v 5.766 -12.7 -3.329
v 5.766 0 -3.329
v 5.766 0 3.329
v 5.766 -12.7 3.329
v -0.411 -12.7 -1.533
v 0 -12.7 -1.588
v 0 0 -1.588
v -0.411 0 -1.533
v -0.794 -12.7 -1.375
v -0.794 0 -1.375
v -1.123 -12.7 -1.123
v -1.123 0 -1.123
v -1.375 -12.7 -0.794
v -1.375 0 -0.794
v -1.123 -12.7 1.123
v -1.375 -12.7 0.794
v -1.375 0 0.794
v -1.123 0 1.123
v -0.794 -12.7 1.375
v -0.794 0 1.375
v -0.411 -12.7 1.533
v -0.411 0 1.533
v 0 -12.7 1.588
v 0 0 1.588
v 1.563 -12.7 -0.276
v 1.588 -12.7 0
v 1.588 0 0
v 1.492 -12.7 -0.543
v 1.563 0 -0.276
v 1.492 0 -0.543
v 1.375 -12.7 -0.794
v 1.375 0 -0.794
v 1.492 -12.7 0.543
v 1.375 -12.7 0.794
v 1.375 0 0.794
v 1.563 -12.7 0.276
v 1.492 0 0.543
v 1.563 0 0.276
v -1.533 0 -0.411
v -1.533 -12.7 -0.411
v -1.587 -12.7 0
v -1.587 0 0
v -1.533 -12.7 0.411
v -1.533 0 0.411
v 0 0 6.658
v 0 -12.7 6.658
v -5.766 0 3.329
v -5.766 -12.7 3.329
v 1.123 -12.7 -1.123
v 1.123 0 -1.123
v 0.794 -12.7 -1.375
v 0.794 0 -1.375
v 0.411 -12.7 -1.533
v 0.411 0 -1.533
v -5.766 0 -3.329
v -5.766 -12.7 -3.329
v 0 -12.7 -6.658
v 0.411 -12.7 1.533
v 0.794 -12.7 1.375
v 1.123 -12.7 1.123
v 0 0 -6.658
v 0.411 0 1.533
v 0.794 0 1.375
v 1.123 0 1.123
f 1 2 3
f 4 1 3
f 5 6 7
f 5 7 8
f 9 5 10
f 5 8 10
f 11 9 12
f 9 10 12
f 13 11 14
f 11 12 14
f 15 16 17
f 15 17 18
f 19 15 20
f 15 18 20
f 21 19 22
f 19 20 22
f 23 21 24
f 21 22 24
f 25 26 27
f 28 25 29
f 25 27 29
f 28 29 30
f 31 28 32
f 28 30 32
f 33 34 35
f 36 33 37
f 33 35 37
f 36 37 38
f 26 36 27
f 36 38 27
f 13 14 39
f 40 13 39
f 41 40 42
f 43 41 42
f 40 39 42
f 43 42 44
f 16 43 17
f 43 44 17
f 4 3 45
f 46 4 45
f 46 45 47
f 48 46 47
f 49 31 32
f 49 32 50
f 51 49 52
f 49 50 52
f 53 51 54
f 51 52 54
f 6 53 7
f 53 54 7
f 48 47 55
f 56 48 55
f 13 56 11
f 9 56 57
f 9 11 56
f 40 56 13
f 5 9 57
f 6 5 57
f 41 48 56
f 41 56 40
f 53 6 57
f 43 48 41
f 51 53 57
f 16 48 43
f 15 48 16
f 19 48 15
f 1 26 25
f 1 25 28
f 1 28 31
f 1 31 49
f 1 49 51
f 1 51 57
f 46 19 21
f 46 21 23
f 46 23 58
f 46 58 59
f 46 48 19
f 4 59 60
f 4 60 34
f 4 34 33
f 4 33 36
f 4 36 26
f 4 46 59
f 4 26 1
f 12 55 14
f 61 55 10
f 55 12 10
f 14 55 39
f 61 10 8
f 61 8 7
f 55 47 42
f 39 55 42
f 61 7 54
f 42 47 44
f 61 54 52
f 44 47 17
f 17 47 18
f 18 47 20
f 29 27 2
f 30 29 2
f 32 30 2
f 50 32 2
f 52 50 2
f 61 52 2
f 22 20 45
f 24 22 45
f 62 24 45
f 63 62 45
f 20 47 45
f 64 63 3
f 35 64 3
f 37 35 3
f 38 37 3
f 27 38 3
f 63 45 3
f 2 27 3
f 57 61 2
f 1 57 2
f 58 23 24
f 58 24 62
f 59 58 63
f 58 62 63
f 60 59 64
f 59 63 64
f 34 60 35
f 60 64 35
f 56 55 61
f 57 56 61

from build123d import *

# Parameters (mm, degrees)
F1_DEPTH = 12.7


# Not quite as in the source:
# - a feature names something its author has since deleted; it is built from what else it names


with BuildPart() as f1:
    # F0 (on Front) → F1 (new body)
    with BuildSketch(Plane.XZ):
        Polygon((5.7657995114, 3.3288859), (0, 6.6577718), (-5.7657995114, 3.3288859), (-5.7657995114, -3.3288859), (0, -6.6577718), (5.7657995114, -3.3288859), align=None)
        with BuildLine():
            ThreePointArc((-1.3748153285, 0.79375), (-0.79375, 1.3748153285), (0, 1.5875))
            ThreePointArc((0, 1.5875), (0.79375, 1.3748153285), (1.3748153285, 0.79375))
            ThreePointArc((1.3748153285, 0.79375), (1.5334072492, 0.4108752341), (1.5875, 0))
            ThreePointArc((1.5875, 0), (1.5334072492, -0.4108752341), (1.3748153285, -0.79375))
            ThreePointArc((1.3748153285, -0.79375), (0.79375, -1.3748153285), (0, -1.5875))
            ThreePointArc((0, -1.5875), (-0.79375, -1.3748153285), (-1.3748153285, -0.79375))
            ThreePointArc((-1.3748153285, -0.79375), (-1.5875, 0), (-1.3748153285, 0.79375))
        make_face(mode=Mode.SUBTRACT)
    extrude(amount=F1_DEPTH)


solid = f1.part
